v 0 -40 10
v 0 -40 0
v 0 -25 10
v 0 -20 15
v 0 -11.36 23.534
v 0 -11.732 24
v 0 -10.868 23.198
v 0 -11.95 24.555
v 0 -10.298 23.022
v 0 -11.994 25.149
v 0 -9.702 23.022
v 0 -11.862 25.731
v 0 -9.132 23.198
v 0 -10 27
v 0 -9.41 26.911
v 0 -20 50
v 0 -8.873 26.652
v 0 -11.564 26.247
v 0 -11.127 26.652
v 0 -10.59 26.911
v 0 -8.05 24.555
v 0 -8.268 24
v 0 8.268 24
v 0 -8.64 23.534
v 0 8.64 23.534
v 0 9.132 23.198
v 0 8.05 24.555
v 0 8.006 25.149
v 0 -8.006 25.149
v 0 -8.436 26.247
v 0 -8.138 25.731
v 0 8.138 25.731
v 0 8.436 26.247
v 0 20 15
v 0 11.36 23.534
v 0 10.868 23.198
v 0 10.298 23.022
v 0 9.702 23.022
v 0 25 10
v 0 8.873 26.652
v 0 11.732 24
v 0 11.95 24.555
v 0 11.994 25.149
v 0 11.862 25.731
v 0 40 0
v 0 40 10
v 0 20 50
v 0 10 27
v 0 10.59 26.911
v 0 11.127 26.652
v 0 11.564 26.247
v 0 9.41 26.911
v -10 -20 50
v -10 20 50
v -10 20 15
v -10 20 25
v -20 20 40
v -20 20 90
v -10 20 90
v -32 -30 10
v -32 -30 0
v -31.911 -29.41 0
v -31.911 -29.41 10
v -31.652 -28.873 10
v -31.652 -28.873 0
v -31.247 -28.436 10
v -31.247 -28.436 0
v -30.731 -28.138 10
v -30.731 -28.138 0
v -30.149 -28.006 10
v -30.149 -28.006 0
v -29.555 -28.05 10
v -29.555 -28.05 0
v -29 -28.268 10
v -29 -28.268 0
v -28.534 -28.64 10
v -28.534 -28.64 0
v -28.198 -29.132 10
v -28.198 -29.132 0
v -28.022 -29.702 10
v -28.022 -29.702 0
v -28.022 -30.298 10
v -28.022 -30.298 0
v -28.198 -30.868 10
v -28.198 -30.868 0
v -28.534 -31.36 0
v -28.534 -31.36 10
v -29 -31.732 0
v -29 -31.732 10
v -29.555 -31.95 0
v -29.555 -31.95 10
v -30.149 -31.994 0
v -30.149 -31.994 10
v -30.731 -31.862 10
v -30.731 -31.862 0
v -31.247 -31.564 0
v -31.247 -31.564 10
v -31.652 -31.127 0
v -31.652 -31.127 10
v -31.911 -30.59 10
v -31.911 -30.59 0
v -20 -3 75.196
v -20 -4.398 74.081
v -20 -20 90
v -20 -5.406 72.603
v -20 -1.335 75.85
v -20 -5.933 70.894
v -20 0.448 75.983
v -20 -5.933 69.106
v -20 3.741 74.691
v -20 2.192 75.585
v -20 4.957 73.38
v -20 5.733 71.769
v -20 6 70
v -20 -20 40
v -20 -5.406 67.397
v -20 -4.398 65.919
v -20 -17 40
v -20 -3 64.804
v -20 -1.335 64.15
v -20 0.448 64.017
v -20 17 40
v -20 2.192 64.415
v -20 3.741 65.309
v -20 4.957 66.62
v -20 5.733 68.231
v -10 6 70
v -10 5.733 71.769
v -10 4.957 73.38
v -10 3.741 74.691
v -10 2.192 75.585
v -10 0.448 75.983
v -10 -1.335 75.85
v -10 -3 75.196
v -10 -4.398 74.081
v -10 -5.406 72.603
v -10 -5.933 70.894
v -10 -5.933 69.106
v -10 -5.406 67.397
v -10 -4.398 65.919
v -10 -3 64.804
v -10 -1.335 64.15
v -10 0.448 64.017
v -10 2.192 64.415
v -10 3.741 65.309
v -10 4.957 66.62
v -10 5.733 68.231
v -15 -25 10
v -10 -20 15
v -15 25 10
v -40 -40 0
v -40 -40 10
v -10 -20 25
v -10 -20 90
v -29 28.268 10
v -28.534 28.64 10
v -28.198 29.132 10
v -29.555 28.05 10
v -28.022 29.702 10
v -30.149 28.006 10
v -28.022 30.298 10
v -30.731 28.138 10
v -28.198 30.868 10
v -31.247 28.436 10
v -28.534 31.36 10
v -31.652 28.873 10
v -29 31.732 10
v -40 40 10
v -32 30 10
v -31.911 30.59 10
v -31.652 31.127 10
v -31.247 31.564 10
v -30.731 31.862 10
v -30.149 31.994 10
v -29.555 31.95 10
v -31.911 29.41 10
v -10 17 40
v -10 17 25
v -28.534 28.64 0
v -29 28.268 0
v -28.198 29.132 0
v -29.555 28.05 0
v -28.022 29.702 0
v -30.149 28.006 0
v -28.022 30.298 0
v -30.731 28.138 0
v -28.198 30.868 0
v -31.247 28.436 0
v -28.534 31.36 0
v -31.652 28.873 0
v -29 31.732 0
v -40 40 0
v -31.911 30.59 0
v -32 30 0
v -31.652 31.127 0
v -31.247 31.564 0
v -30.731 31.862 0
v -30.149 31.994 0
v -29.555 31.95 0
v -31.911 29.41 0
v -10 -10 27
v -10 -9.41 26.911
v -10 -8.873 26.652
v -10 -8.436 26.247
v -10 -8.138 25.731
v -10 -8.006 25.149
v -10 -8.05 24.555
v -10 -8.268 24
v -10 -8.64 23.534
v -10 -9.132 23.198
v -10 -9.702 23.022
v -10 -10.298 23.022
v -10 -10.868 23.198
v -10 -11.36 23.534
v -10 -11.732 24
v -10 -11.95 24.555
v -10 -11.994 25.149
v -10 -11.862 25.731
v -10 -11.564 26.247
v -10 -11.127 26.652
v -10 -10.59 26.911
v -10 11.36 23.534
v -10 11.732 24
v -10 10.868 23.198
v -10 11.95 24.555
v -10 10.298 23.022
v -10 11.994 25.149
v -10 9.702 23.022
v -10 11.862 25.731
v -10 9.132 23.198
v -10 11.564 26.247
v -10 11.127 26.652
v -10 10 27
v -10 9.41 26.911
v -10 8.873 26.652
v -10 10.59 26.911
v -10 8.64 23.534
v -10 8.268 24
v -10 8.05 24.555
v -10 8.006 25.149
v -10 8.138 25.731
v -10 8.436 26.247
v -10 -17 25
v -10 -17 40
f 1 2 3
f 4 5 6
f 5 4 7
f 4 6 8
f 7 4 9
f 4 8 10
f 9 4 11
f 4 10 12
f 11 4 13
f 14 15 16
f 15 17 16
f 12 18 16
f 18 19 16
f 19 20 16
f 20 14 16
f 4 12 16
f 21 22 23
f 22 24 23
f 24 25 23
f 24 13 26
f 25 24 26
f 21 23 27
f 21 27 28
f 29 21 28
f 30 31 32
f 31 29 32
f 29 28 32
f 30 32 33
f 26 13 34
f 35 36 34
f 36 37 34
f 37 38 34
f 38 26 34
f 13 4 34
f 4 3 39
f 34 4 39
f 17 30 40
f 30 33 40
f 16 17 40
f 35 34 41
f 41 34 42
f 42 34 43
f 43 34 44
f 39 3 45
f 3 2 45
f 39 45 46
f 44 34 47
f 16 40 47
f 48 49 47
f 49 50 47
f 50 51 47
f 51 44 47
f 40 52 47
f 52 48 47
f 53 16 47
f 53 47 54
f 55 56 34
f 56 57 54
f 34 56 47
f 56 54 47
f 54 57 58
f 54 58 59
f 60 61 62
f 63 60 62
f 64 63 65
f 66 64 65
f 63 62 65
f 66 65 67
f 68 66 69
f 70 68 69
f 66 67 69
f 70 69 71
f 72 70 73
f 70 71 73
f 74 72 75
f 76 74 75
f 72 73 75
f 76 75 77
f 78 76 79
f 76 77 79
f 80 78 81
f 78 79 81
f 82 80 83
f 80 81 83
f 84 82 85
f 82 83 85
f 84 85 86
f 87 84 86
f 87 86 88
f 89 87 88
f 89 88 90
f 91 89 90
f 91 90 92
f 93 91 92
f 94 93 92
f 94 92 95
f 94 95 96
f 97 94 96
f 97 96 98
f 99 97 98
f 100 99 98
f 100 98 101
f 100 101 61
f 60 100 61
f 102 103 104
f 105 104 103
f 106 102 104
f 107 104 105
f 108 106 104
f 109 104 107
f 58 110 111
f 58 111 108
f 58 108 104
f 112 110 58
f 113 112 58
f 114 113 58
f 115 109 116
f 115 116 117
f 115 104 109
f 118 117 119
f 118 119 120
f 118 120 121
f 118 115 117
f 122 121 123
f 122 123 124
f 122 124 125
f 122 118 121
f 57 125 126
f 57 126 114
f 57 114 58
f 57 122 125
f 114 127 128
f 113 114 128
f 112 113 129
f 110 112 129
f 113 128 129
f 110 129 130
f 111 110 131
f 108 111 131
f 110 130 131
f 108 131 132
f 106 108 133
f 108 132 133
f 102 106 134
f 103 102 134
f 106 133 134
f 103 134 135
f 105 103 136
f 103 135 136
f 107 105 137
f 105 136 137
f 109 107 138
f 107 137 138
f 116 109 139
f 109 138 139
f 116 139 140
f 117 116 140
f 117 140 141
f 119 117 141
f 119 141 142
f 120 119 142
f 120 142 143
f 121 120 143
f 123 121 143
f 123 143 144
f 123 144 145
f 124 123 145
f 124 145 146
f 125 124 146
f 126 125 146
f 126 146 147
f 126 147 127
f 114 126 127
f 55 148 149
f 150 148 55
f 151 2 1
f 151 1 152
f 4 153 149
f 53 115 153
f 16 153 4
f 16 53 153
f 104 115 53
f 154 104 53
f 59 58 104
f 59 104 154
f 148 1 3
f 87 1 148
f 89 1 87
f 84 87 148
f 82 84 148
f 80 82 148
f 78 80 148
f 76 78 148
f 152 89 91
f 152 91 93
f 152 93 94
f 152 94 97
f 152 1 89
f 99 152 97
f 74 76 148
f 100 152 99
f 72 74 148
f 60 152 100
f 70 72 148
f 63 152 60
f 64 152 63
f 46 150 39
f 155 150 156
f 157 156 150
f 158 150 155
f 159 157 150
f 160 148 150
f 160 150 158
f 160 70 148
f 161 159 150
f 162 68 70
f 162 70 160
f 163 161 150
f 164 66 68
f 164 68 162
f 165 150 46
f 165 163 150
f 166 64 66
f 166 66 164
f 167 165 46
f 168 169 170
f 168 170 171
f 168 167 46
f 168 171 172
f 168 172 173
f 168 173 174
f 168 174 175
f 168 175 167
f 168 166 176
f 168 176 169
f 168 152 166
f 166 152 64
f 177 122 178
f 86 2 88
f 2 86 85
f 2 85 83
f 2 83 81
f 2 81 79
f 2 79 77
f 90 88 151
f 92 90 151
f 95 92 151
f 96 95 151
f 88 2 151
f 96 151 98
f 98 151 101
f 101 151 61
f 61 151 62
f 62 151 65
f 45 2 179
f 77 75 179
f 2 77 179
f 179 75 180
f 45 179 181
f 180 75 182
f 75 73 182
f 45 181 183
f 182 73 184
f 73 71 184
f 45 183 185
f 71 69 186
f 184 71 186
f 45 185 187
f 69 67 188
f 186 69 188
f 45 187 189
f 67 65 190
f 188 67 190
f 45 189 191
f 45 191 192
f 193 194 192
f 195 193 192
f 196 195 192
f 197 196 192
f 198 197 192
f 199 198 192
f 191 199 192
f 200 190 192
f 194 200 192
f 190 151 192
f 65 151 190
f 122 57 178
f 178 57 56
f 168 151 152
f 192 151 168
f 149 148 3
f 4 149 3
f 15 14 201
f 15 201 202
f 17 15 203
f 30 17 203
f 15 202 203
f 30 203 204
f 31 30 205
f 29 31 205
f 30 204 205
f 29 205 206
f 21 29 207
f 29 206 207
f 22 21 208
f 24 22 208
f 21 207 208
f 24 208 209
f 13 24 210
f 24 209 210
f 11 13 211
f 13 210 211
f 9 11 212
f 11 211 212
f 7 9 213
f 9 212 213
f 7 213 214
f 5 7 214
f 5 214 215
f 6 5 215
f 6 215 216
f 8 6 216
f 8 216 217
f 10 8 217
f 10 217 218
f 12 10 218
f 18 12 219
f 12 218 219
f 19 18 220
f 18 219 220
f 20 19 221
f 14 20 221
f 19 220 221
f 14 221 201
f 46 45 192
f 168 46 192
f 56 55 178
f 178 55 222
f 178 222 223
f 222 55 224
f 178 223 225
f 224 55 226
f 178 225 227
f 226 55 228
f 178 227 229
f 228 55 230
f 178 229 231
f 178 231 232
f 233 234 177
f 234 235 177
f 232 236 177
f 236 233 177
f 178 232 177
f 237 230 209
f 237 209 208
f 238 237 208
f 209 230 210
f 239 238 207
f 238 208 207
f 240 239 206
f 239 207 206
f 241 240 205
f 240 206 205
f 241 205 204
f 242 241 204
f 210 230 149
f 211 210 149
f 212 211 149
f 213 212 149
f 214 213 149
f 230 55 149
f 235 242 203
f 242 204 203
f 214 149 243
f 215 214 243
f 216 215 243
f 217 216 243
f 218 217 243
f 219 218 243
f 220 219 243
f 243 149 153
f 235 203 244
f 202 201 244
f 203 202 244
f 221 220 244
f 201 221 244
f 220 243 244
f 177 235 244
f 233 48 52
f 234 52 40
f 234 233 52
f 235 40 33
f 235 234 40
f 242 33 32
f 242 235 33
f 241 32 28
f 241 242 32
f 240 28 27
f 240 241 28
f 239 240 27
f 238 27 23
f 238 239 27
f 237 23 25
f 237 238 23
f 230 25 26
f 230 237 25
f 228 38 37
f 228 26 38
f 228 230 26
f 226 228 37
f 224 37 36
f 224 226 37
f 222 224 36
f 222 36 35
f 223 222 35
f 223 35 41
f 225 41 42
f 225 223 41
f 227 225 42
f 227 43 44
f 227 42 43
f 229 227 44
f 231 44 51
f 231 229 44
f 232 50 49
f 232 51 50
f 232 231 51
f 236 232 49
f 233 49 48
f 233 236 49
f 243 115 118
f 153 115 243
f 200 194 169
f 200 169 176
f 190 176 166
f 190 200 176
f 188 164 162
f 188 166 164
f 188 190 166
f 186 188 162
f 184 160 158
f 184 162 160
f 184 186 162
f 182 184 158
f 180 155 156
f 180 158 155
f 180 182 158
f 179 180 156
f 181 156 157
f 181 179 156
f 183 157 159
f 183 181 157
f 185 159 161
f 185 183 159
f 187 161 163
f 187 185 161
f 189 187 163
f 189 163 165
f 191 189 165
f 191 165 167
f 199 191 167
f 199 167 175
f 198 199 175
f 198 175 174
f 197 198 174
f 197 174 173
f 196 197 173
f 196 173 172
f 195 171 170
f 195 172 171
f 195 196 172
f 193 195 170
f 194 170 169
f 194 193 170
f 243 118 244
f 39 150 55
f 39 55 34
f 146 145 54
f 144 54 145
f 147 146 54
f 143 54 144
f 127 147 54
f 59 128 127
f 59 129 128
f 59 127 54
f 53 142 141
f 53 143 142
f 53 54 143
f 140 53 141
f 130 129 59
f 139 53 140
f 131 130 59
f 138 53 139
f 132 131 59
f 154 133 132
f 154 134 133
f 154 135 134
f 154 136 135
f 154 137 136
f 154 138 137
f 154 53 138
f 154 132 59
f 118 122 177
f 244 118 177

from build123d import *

# Parameters (mm, degrees)
SKETCH1_W                      = 80
SKETCH1_H                      = 80
BOSS_EXTRUDE1_DEPTH            = 10
SKETCH2_W                      = 40
SKETCH2_H                      = 40
BOSS_EXTRUDE2_DEPTH            = 80
F_4_0_4_DIAMETER_HOLE1_D       = 4
CUT_EXTRUDE1_REACH             = 117.326
CUT_EXTRUDE1_DIRECTION_2_REACH = 117.326
CUT_EXTRUDE2_REACH             = 117.326
SKETCH10_W                     = 10
SKETCH10_H                     = 30
BOSS_EXTRUDE3_DEPTH            = 3
F_12_0_MM_DOWEL_HOLES1_D       = 12
CHAMFER1_SIZE                  = 5


with BuildPart() as part:
    # Sketch1 → Boss-Extrude1 (new body)
    with BuildSketch(Plane(origin=(0, 0, 0), x_dir=(0, 1, 0), z_dir=(0, 0, 1))):
        Rectangle(SKETCH1_W, SKETCH1_H)
    extrude(amount=BOSS_EXTRUDE1_DEPTH)

    # Sketch2 → Boss-Extrude2 (add)
    with BuildSketch(Plane.XY.offset(10)):
        Rectangle(SKETCH2_W, SKETCH2_H)
    extrude(amount=BOSS_EXTRUDE2_DEPTH)

    # Ø4.0 (4) Diameter Hole1 (through all)
    with Locations(Plane.XY.offset(10)):
        with Locations((-30, -30), (30, -30)):
            f_4_0_4_diameter_hole1 = Hole(F_4_0_4_DIAMETER_HOLE1_D / 2)

    # Sketch9 → Cut-Extrude1 (cut, up to next)
    with BuildSketch(Plane.XZ.offset(20), mode=Mode.PRIVATE) as cut_extrude1_sk1:
        Polygon((-10, 90), (40, 90), (40, 45), (40, 0), (0, 0), (0, 50), (-10, 50), align=None)
    cut_extrude1_tool1 = extrude(cut_extrude1_sk1.sketch, amount=-CUT_EXTRUDE1_REACH, mode=Mode.PRIVATE) & part.part
    add(cut_extrude1_tool1.solids().sort_by_distance((17.5, -20, 47.5))[0], mode=Mode.SUBTRACT)

    # Sketch9 → Cut-Extrude1 direction 2 (cut, up to next)
    with BuildSketch(Plane.XZ.offset(20), mode=Mode.PRIVATE) as cut_extrude1_direction_2_sk1:
        Polygon((-10, 90), (40, 90), (40, 45), (40, 0), (0, 0), (0, 50), (-10, 50), align=None)
    cut_extrude1_direction_2_tool1 = extrude(cut_extrude1_direction_2_sk1.sketch, amount=CUT_EXTRUDE1_DIRECTION_2_REACH, mode=Mode.PRIVATE) & part.part
    add(cut_extrude1_direction_2_tool1.solids().sort_by_distance((17.5, -20, 47.5))[0], mode=Mode.SUBTRACT)

    # Sketch10 → Cut-Extrude2 (cut, up to next)
    with BuildSketch(Plane.XZ.offset(20), mode=Mode.PRIVATE) as cut_extrude2_sk1:
        with Locations((-15, 25)):
            Rectangle(SKETCH10_W, SKETCH10_H)
    cut_extrude2_tool1 = extrude(cut_extrude2_sk1.sketch, amount=-CUT_EXTRUDE2_REACH, mode=Mode.PRIVATE) & part.part
    add(cut_extrude2_tool1.solids().sort_by_distance((-15, -20, 25))[0], mode=Mode.SUBTRACT)

    # Sketch11 → Boss-Extrude3 (add)
    with BuildSketch(Plane.XZ.offset(20)):
        Polygon((-20, 40), (-10, 25), (-10, 40), align=None)
    boss_extrude3 = extrude(amount=-BOSS_EXTRUDE3_DEPTH)

    # Mirror2: Boss-Extrude3 across plane
    add(boss_extrude3.mirror(Plane.ZX))

    # Sketch13 → Ø4.0 (4) Diameter Hole2 (revolve, cut)
    with BuildSketch(Plane(origin=(-10, 10, 25), x_dir=(0, 0, 1), z_dir=(0, 1, 0))):
        Polygon((0, 0), (0, 11.301721238), (2, 10.1), (2, 0), align=None)
    f_4_0_4_diameter_hole2 = revolve(axis=Axis((-16.35, 10, 25), (1, 0, 0)), mode=Mode.SUBTRACT)

    # Ø12.0 mm Dowel Holes1 (through all)
    with Locations(Plane(origin=(-20, 0, 0), x_dir=(0, -1, 0), z_dir=(-1, 0, 0))):
        with Locations((0, 70)):
            Hole(F_12_0_MM_DOWEL_HOLES1_D / 2)

    # Chamfer1
    chamfer1_edges = [part.edges().sort_by_distance(p)[0] for p in [
        (-5, 20, 10),
        (-5, -20, 10),
        (-10, 0, 10),
    ]]
    chamfer(chamfer1_edges, length=CHAMFER1_SIZE)

    # Mirror3: Ø4.0 (4) Diameter Hole1, Ø4.0 (4) Diameter Hole2 across plane
    add(f_4_0_4_diameter_hole1.mirror(Plane.ZX), mode=Mode.SUBTRACT)
    add(f_4_0_4_diameter_hole2.mirror(Plane.ZX), mode=Mode.SUBTRACT)


solid = part.part
